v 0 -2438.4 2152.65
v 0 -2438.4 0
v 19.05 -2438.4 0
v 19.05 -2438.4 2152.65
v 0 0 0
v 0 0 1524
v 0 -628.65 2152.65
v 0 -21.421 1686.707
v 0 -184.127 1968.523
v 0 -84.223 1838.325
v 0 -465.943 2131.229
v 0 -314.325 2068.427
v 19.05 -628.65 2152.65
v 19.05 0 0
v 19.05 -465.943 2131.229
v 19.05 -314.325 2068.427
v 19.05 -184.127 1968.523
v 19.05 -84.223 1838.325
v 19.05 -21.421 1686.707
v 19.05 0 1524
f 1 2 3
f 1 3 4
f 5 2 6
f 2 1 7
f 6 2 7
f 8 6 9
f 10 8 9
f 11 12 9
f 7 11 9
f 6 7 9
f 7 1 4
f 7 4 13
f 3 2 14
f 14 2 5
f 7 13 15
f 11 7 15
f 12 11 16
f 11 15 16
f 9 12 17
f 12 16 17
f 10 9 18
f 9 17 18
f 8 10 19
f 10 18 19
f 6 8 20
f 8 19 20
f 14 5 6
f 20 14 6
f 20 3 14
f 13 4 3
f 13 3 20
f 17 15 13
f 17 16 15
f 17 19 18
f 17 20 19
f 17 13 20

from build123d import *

# Parameters (mm, degrees)
F0_W     = 1524
F0_H     = 2152.65
F1_DEPTH = 19.05
F2_W     = 914.4
F2_H     = 2152.65
F3_DEPTH = 19.05
F5_DEPTH = 25.4


with BuildPart() as f1:
    # F0 (on Right) → F1 (new body)
    with BuildSketch(Plane.YZ):
        with Locations((-762, 1076.325)):
            Rectangle(F0_W, F0_H)
    extrude(amount=F1_DEPTH)

    # F2 (on Right) → F3 (join)
    with BuildSketch(Plane.YZ):
        with Locations((-1981.2, 1076.325)):
            Rectangle(F2_W, F2_H)
    extrude(amount=F3_DEPTH)

    # F4 (on face) → F5 (cut)
    with BuildSketch(Plane.YZ.offset(19.05)):
        with BuildLine():
            ThreePointArc((-628.65, 2152.65), (-184.127322, 1968.522678), (0, 1524))
            Line((0, 1524), (0, 2152.65))
            Line((0, 2152.65), (-628.65, 2152.65))
        make_face()
    extrude(amount=-F5_DEPTH, mode=Mode.SUBTRACT)


solid = f1.part
